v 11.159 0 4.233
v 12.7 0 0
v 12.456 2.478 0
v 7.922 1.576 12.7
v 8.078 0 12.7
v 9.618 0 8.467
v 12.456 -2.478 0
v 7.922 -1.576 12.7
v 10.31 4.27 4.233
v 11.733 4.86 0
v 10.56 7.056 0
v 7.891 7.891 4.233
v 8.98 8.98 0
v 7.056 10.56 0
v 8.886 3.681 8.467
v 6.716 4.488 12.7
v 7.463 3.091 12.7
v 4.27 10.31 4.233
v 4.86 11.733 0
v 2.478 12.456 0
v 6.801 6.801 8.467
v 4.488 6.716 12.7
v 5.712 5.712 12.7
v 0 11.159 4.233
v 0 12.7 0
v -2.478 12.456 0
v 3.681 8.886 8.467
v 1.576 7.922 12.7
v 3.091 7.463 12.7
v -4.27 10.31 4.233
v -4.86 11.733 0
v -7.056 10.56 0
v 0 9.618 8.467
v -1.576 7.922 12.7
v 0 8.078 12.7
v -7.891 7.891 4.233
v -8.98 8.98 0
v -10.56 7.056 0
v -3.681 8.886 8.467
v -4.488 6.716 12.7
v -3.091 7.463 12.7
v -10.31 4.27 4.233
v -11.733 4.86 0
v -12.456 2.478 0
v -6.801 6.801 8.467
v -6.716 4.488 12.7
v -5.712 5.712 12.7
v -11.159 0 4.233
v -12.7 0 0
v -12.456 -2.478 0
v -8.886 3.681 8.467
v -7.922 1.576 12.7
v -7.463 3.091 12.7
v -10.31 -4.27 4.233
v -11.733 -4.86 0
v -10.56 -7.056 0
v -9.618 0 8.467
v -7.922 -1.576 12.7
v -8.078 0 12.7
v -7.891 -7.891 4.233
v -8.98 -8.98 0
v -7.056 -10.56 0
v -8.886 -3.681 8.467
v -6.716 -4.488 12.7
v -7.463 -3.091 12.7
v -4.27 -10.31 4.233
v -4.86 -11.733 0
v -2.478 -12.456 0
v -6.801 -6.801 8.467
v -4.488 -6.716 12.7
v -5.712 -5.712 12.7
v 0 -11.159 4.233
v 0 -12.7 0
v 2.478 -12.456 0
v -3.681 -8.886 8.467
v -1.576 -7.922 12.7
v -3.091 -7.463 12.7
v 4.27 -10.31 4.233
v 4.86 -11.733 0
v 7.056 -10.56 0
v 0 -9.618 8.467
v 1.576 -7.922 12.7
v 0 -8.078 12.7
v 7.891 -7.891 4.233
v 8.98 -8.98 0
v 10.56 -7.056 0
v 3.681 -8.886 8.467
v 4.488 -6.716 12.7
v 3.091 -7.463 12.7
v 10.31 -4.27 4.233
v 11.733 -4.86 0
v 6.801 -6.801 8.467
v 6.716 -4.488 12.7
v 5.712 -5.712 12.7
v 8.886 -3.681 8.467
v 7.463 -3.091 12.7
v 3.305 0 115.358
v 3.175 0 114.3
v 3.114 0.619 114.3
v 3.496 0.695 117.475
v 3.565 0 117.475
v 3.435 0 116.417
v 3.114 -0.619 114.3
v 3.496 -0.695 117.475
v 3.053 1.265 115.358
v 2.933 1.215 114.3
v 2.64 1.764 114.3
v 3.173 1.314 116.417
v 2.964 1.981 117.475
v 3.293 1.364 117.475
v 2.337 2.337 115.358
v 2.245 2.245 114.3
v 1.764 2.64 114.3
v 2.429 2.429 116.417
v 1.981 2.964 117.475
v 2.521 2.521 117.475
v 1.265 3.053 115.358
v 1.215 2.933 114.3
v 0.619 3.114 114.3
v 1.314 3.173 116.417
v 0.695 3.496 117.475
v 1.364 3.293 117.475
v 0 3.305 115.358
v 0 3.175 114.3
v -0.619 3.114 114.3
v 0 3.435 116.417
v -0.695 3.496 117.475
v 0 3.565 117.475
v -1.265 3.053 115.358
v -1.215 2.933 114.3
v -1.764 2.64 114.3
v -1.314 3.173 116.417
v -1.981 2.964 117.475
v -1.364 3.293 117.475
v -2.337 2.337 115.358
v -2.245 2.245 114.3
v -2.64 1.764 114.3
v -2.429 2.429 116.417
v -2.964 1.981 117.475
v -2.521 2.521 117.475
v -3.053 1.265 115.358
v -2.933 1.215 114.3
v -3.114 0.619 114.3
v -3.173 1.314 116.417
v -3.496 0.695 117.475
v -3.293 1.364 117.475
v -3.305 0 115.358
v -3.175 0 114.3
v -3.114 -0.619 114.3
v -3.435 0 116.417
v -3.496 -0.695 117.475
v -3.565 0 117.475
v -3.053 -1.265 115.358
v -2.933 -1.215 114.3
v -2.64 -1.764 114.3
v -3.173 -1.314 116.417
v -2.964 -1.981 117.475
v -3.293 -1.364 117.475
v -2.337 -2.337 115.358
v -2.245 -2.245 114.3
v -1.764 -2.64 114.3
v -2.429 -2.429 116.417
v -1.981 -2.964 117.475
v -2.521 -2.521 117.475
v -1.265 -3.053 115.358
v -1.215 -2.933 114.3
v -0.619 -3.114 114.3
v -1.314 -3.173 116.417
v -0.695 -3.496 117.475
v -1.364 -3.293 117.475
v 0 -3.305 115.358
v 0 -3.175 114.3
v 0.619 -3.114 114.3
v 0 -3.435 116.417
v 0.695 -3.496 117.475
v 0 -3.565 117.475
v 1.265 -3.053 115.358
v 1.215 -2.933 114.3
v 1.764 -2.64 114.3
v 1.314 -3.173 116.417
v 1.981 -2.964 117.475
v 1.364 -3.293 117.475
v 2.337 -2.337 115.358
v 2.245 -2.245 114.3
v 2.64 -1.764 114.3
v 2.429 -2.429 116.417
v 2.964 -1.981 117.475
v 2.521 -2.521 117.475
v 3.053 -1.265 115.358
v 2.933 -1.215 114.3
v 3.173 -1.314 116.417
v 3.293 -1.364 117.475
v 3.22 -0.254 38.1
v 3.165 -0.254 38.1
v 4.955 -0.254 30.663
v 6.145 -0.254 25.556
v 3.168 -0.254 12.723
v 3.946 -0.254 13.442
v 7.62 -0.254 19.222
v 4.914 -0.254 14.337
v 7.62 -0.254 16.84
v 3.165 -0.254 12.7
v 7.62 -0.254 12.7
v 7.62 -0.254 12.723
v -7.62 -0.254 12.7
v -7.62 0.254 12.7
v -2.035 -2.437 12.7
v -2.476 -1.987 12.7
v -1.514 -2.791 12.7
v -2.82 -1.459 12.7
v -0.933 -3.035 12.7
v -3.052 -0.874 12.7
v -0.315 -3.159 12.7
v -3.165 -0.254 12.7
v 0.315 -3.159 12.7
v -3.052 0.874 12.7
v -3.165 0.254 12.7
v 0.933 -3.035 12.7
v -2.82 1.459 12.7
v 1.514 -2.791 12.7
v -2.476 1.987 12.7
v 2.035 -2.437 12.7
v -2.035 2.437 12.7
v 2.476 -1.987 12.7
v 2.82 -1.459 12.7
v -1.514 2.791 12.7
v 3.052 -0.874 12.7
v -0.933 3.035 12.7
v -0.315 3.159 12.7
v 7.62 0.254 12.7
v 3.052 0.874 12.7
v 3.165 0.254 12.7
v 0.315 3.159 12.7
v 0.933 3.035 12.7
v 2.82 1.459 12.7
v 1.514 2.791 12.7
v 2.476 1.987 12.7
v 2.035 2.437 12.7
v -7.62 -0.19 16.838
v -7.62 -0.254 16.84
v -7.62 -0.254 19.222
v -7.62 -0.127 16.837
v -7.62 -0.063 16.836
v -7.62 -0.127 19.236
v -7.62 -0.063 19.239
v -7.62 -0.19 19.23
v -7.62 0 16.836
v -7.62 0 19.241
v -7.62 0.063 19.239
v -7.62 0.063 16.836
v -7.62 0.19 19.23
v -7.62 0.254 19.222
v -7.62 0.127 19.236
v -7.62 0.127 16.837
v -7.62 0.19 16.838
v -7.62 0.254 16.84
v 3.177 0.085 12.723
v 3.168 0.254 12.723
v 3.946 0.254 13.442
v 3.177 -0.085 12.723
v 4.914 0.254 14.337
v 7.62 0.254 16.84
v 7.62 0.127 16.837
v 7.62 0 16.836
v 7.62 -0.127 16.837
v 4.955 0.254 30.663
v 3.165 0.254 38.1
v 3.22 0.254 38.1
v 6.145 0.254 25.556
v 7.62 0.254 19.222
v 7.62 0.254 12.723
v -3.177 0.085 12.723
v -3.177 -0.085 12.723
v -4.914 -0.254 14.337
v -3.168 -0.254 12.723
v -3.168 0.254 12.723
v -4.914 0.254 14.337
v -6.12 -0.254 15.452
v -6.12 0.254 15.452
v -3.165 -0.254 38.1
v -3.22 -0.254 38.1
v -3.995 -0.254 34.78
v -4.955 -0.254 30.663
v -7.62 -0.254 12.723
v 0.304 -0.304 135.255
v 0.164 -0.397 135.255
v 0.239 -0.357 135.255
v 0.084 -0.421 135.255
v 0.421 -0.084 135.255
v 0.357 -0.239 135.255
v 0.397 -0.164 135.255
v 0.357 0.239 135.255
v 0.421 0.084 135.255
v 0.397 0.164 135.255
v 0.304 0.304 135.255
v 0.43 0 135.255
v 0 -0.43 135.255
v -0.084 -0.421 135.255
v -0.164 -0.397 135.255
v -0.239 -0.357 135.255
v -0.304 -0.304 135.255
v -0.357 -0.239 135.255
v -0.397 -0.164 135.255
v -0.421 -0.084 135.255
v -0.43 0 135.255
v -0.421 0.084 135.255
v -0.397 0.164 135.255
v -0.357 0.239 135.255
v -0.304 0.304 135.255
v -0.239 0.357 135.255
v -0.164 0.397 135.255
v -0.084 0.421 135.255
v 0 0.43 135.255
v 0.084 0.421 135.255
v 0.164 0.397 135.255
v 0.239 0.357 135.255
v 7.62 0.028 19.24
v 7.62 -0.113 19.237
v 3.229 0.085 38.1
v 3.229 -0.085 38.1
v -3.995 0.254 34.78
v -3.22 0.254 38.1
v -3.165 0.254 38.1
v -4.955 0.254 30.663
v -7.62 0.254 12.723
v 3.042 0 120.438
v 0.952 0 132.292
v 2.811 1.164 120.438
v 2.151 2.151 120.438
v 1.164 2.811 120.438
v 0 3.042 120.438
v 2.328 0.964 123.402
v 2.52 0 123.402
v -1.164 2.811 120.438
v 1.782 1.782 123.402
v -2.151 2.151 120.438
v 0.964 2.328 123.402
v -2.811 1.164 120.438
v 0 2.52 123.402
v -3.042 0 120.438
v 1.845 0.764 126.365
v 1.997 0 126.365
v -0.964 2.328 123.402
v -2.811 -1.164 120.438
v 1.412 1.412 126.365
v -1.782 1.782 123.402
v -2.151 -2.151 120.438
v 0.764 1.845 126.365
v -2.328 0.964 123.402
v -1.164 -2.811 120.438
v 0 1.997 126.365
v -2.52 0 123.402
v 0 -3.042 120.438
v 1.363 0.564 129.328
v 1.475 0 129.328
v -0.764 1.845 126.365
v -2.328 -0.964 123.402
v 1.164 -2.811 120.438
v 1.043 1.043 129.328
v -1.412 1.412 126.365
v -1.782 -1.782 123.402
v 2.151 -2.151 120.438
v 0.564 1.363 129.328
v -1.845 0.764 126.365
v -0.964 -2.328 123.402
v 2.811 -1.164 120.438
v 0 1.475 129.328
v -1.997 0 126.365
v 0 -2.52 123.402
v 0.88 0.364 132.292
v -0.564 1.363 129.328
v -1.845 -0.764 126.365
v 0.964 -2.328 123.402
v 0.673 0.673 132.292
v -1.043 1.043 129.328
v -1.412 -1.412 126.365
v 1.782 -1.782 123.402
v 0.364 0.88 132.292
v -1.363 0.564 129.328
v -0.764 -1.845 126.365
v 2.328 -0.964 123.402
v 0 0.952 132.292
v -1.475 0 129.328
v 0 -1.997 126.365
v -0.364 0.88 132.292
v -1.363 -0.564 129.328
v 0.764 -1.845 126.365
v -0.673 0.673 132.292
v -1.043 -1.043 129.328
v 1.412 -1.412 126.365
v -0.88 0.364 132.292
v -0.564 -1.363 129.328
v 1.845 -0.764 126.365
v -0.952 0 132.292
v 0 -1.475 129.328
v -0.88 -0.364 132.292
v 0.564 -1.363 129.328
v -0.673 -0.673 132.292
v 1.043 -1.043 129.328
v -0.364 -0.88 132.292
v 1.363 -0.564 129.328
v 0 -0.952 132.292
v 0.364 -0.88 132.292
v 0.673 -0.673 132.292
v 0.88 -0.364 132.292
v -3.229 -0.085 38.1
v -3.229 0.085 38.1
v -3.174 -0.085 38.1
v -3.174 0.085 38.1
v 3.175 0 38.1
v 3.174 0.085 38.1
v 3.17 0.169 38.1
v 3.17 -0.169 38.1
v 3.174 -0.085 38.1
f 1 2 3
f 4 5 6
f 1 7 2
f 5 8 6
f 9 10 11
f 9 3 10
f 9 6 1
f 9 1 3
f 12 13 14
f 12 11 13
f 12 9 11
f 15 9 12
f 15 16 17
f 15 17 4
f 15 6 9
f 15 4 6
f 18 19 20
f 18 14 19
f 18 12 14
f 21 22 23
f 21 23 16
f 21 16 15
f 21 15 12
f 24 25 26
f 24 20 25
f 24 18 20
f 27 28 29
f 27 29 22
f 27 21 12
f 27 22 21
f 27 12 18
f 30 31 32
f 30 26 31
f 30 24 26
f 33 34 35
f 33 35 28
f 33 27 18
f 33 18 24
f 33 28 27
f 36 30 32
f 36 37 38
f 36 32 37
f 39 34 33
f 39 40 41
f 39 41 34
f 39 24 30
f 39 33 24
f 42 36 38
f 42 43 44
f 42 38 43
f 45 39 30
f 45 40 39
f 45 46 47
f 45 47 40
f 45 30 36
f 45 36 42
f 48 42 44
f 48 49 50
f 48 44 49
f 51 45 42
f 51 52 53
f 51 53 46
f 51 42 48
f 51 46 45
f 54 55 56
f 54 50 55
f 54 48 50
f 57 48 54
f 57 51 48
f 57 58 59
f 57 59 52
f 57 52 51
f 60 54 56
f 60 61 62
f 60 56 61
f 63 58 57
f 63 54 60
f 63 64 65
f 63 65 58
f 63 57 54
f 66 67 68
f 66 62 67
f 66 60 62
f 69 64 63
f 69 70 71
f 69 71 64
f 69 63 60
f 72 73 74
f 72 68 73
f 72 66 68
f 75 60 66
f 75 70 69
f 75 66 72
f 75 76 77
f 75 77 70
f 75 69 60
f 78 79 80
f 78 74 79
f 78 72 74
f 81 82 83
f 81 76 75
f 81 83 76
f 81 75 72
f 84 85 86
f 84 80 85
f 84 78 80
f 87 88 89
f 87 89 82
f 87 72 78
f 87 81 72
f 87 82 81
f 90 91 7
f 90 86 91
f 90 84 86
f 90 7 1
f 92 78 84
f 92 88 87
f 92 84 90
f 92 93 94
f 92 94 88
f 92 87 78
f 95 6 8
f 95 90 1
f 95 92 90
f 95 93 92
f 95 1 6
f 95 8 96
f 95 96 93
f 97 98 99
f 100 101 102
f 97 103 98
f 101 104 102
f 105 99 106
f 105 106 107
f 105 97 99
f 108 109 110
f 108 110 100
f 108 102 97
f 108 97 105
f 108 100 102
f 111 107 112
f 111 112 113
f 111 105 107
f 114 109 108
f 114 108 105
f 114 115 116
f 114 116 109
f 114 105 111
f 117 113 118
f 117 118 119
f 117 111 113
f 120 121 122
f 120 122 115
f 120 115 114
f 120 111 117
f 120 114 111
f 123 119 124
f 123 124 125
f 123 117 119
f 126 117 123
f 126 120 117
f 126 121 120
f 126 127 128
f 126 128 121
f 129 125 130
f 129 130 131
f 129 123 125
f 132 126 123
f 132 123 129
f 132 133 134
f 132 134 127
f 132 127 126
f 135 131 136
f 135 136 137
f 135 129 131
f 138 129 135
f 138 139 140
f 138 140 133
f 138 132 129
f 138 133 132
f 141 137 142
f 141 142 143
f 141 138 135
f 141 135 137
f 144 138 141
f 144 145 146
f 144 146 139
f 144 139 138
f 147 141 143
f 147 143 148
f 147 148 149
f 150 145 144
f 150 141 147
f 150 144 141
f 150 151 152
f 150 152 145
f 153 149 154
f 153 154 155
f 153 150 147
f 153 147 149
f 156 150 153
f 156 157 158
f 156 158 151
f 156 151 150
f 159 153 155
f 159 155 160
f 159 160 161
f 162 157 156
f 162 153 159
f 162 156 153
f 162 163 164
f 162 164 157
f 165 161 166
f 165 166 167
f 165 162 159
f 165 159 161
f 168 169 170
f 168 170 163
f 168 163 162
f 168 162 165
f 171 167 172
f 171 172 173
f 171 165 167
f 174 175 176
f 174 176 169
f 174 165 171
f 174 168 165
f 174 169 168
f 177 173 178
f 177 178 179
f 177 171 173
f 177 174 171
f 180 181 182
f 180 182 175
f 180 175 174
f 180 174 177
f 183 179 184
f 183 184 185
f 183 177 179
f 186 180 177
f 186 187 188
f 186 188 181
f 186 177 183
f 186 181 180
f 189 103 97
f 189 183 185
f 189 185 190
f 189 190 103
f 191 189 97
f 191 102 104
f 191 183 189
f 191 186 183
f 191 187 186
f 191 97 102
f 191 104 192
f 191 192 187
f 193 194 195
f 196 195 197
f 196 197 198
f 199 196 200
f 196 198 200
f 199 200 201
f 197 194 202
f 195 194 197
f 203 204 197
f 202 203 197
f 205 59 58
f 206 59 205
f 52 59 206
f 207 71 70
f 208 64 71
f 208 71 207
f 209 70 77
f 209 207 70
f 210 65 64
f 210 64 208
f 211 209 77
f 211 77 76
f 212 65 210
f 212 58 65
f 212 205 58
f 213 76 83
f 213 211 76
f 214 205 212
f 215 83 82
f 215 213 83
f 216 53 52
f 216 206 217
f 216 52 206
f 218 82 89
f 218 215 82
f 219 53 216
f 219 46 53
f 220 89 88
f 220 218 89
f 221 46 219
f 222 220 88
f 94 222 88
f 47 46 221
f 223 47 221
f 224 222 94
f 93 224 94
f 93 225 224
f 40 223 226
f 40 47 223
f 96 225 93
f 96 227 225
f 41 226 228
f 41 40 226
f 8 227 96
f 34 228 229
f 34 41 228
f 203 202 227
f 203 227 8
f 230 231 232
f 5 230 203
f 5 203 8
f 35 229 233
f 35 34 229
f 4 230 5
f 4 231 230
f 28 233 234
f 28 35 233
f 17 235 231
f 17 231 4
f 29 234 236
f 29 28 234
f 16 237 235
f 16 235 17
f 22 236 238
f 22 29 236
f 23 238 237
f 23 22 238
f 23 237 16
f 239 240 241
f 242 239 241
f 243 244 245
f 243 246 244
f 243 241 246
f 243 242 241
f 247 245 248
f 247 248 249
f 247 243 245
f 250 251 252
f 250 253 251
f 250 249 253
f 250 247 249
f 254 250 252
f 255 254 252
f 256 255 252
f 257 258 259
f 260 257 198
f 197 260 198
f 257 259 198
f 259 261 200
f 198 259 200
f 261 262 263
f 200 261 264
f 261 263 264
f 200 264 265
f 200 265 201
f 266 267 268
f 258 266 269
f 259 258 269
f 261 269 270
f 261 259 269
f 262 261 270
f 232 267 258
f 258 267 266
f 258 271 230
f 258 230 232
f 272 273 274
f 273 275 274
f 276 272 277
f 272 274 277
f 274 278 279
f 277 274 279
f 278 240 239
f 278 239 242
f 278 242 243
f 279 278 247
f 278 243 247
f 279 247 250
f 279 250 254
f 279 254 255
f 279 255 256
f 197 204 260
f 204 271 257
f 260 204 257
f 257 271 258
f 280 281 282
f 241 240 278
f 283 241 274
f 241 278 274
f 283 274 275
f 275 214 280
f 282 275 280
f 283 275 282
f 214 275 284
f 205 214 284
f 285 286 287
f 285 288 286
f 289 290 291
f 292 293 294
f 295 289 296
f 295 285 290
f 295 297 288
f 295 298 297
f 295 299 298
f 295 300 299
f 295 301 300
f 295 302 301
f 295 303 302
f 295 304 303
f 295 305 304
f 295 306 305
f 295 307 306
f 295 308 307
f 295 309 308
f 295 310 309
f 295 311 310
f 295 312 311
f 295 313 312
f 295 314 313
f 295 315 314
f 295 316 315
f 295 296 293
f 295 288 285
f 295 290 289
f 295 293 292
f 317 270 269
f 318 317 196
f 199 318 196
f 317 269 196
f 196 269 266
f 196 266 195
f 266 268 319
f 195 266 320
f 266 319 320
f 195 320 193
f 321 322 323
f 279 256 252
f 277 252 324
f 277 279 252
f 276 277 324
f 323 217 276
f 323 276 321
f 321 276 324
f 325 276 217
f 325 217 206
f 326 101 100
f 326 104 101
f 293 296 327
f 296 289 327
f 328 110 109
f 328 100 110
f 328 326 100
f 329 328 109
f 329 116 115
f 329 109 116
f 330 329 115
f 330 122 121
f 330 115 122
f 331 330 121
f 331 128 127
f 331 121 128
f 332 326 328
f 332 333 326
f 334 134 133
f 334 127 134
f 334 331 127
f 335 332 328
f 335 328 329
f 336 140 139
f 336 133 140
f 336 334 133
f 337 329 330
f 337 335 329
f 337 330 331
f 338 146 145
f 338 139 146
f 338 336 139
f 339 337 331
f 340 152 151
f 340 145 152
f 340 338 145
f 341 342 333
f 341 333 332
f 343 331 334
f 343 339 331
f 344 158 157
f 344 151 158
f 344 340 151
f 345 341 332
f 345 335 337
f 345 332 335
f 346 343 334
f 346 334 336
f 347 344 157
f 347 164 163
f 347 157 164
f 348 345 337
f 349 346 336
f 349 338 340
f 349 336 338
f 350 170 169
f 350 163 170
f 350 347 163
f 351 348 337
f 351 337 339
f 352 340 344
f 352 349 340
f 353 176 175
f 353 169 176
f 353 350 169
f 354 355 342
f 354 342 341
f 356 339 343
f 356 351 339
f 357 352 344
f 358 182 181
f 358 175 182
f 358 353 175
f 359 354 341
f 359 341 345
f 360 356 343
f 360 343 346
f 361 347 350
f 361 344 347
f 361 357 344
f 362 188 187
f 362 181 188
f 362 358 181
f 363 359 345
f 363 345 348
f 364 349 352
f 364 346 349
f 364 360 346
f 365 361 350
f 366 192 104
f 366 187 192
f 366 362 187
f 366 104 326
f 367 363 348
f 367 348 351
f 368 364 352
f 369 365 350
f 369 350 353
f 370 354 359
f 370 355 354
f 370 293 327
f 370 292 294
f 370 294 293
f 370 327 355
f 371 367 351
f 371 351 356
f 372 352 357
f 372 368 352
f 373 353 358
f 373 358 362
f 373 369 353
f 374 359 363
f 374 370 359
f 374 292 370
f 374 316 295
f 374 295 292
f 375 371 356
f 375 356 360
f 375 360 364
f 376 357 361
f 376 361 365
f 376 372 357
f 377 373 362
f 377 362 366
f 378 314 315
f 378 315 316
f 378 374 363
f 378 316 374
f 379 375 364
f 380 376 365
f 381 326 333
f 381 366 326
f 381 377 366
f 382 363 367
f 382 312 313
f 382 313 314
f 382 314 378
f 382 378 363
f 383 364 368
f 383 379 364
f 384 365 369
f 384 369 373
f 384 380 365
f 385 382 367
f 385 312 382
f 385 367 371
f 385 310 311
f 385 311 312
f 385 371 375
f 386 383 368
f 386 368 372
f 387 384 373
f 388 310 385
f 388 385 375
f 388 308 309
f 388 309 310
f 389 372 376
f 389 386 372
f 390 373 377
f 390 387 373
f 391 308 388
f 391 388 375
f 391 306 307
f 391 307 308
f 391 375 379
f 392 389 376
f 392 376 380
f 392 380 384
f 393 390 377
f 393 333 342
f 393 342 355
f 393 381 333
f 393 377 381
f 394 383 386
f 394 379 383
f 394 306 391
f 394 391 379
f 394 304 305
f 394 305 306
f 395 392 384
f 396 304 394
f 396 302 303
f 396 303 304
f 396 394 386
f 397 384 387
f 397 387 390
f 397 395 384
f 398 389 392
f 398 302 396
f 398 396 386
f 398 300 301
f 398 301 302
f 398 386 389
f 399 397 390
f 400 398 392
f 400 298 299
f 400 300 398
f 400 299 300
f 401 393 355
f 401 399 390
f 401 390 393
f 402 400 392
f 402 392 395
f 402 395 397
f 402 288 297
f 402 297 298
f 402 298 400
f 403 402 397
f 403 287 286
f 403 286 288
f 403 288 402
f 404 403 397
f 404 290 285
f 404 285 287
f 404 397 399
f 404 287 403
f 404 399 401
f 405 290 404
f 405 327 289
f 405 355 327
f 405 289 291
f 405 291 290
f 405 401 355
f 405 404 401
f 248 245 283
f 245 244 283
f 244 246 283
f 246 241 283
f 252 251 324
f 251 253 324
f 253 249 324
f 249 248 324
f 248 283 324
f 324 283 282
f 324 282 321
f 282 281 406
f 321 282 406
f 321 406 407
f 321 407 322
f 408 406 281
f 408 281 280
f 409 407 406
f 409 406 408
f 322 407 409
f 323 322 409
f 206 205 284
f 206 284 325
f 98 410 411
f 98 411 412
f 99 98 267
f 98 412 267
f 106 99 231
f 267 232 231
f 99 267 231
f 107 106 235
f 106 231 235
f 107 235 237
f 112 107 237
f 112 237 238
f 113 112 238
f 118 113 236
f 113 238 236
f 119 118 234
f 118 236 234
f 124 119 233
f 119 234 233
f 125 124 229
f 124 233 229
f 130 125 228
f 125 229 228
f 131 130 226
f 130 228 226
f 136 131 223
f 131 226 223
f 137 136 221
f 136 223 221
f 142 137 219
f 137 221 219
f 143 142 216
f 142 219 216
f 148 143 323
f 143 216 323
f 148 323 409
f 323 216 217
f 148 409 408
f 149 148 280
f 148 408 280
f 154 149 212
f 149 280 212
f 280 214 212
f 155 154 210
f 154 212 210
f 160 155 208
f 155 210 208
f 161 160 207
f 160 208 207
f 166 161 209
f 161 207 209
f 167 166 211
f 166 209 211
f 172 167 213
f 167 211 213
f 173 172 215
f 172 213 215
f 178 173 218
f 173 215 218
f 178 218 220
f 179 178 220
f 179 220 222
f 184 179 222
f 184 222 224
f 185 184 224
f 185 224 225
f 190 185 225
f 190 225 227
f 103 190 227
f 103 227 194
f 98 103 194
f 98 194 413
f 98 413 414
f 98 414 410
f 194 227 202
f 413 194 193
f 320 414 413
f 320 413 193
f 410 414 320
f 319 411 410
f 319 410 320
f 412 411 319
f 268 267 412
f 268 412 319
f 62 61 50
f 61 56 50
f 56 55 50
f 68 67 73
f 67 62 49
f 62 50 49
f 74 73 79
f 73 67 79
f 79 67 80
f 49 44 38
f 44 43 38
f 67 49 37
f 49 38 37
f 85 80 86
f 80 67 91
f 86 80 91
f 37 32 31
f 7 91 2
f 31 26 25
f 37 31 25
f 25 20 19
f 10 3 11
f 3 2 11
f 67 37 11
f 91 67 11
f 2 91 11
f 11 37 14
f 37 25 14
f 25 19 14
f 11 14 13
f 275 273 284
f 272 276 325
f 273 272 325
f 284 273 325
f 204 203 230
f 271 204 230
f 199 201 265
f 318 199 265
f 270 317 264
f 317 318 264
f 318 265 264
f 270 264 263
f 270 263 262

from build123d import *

# Parameters (mm, degrees)
F0_R     = 12.7
F1_DEPTH = 12.7
F1_TAPER = 20
F2_R     = 3.175
F3_DEPTH = 101.6
F4_R     = 3.175
F5_DEPTH = 3.175
F5_TAPER = -7
F6_R     = 3.5648409809
F7_DEPTH = 17.78
F7_TAPER = 10
F8_W     = 15.24
F8_H     = 0.508
F9_DEPTH = 38.1


with BuildPart() as f1:
    # F0 (on Top) → F1 (new body)
    with BuildSketch(Plane.XY):
        Circle(F0_R)
    extrude(amount=F1_DEPTH, taper=F1_TAPER)

    # F2 (on face) → F3 (join)
    with BuildSketch(Plane.XY.offset(12.7)):
        Circle(F2_R)
    extrude(amount=F3_DEPTH)

    # F4 (on face) → F5 (join)
    with BuildSketch(Plane.XY.offset(114.3)):
        Circle(F4_R)
    extrude(amount=F5_DEPTH, taper=F5_TAPER)

    # F6 (on face) → F7 (join)
    with BuildSketch(Plane.XY.offset(117.475)):
        Circle(F6_R)
    extrude(amount=F7_DEPTH, taper=F7_TAPER)

    # F8 (on Top) → F9 (join)
    with BuildSketch(Plane.XY):
        Rectangle(F8_W, F8_H)
    extrude(amount=F9_DEPTH)

    # F10 (on Front) → F12 (revolve, cut)
    with BuildSketch(Plane.XZ):
        Polygon((-8.0804247409, 17.2624252737), (-3.1776875257, 38.326036185), (-8.6857005954, 39.8392230272), (-11.7726093158, 12.7228545025), (-3.1776875257, 12.7228545025), align=None)
    revolve(axis=Axis((0, 0, -4.9230908044), (0, 0, -1)), mode=Mode.SUBTRACT)


solid = f1.part
